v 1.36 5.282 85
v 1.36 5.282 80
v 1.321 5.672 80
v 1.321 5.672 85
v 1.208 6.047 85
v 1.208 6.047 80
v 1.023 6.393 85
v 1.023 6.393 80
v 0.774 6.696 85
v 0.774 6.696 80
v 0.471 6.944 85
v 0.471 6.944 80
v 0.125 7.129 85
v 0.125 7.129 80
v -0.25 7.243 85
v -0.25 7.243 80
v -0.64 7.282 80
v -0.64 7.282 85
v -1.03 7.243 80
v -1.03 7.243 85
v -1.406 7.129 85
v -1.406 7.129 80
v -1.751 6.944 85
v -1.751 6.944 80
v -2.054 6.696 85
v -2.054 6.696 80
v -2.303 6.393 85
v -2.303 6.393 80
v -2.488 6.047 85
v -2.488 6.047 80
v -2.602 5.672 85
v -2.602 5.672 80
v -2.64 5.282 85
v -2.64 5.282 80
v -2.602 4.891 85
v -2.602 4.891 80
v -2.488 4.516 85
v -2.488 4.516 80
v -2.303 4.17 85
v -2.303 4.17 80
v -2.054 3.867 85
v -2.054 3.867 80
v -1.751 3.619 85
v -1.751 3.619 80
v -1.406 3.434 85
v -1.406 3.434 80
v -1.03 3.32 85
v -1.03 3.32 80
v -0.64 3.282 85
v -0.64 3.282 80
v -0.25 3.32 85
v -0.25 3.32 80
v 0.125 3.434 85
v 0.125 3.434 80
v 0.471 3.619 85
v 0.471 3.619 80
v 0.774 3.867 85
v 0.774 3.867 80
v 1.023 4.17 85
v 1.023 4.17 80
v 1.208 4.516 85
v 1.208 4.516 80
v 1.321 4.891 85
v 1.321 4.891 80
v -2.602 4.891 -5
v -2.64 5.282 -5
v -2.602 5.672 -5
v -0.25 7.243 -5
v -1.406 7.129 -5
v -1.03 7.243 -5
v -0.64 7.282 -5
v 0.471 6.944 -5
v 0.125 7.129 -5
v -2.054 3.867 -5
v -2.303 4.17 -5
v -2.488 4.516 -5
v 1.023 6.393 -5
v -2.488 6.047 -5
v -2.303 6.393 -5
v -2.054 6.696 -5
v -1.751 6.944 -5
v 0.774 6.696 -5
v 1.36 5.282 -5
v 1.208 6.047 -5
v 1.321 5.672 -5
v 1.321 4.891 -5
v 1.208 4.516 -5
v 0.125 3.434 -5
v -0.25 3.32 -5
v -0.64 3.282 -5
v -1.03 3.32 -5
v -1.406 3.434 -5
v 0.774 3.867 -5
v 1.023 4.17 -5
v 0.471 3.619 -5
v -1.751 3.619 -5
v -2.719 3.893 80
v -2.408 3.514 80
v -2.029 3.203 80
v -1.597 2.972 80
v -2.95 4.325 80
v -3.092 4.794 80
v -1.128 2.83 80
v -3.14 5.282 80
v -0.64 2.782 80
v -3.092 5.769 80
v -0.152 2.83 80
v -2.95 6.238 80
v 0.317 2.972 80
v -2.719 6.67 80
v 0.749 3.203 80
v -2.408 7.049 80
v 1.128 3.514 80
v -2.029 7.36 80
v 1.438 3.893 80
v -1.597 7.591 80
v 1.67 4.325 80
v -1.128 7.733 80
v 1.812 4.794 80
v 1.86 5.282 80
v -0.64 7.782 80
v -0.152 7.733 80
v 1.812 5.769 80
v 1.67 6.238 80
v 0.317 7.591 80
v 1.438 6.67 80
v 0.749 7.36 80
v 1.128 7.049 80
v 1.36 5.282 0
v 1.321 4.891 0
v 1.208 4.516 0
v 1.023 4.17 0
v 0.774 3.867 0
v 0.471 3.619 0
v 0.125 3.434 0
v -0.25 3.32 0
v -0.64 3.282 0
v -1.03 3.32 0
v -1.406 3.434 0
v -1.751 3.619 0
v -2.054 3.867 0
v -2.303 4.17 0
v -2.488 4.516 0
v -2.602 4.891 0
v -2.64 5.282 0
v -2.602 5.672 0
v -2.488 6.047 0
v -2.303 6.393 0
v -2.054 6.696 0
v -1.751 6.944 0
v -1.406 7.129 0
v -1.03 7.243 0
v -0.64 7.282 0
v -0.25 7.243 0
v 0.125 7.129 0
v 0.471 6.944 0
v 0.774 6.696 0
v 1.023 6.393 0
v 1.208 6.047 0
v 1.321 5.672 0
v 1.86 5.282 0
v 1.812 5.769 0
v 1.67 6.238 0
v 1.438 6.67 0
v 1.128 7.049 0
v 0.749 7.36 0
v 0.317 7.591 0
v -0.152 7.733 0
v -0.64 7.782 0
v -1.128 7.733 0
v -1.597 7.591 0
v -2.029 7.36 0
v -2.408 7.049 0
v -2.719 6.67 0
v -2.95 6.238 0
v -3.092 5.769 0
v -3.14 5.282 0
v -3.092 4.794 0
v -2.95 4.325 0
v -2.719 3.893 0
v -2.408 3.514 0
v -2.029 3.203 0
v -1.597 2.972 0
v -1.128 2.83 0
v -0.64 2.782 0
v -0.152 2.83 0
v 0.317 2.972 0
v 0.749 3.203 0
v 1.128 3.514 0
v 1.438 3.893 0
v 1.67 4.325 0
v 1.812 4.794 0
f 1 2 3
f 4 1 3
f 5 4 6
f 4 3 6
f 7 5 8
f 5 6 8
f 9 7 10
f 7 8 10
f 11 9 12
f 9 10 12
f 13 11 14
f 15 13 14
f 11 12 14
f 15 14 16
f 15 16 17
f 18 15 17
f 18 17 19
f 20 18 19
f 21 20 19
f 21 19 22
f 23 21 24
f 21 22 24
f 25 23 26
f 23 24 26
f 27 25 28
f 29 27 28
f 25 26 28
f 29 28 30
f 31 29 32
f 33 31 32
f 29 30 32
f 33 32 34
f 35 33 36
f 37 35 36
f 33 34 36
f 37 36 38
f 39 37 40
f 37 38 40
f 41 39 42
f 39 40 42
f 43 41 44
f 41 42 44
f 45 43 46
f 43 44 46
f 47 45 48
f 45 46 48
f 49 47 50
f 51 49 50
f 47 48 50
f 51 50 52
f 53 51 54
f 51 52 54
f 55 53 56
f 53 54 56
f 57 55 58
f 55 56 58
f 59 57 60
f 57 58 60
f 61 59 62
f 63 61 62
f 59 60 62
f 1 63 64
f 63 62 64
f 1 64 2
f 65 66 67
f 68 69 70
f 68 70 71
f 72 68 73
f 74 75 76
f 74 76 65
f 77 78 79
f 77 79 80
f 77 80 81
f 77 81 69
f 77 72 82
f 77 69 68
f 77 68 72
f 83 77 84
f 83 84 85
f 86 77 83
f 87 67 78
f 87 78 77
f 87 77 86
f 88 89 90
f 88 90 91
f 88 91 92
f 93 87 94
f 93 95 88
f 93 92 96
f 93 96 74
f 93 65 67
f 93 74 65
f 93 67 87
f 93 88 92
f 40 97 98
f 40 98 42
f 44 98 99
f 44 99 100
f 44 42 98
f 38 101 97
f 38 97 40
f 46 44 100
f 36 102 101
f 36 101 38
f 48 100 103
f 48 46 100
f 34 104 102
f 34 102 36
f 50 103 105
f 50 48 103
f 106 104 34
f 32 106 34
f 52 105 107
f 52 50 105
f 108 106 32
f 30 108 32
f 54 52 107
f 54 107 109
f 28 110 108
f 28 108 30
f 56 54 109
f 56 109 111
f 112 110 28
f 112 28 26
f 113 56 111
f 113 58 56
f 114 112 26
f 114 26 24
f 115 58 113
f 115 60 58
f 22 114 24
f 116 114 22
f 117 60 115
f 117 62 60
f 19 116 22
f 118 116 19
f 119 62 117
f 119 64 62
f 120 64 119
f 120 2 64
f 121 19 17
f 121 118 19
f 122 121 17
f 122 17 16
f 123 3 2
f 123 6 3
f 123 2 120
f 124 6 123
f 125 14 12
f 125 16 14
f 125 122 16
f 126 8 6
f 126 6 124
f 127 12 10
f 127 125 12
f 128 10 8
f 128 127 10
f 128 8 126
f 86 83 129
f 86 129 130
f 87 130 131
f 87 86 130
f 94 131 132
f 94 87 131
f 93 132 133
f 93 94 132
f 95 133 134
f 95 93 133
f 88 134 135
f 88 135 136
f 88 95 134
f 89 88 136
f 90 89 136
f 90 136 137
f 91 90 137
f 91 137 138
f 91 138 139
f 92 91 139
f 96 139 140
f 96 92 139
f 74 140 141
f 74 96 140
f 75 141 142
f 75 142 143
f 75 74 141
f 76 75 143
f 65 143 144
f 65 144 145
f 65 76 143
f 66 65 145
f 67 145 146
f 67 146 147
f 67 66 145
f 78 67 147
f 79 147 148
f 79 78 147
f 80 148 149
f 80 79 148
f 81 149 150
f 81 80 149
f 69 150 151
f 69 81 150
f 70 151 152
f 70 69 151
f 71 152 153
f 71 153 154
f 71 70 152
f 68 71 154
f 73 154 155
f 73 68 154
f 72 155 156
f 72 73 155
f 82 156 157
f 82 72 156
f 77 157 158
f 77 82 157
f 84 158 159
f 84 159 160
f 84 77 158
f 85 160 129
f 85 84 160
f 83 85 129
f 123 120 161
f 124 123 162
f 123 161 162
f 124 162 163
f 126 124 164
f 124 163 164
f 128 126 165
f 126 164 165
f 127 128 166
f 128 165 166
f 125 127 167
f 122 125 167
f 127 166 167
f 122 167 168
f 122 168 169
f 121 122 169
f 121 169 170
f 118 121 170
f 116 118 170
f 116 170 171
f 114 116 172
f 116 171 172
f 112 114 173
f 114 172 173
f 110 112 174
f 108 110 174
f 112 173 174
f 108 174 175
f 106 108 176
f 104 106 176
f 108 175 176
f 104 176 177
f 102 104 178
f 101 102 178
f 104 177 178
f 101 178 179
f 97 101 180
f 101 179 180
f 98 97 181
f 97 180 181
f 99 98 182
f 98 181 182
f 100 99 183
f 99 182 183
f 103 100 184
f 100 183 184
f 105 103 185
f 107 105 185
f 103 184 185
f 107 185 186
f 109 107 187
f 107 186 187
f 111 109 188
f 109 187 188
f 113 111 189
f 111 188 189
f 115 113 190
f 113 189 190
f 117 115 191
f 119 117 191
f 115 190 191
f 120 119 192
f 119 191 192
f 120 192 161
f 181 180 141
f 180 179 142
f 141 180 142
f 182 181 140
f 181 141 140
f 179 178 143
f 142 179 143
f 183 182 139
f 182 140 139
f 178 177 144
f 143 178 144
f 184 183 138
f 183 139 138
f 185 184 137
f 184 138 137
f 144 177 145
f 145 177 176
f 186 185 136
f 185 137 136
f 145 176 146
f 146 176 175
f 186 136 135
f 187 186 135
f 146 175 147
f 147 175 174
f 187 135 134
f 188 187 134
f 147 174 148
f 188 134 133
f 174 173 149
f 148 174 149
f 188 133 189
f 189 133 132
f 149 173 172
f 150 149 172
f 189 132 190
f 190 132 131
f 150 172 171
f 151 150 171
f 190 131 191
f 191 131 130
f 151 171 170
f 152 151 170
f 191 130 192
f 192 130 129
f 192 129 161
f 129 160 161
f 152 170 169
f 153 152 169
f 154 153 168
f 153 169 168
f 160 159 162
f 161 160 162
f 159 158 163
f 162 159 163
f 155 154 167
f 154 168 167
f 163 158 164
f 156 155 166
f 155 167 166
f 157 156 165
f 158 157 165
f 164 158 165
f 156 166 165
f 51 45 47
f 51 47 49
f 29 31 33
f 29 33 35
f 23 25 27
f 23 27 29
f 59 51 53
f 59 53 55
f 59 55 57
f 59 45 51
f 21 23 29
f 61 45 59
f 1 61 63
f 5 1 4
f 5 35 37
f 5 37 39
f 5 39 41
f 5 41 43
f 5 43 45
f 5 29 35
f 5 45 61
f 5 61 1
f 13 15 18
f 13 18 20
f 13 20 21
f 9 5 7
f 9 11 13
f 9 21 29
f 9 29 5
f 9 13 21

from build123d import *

# Parameters (mm, degrees)
SKETCH_1_R      = 2.5
EXTRUDE_1_DEPTH = 80
SKETCH_2_R      = 2
EXTRUDE_2_DEPTH = 5
EXTRUDE_START   = 5
SKETCH_3_R      = 2
EXTRUDE_3_DEPTH = 5


with BuildPart() as part:
    # 草图1 → 凸台-拉伸1 (new body)
    with BuildSketch(Plane.XY):
        with Locations((-0.6401844, 5.281521297)):
            Circle(SKETCH_1_R)
    extrude(amount=EXTRUDE_1_DEPTH)

    # 草图2 → 凸台-拉伸2 (add)
    with BuildSketch(Plane.XY.offset(80)):
        with Locations((-0.6401844, 5.281521297)):
            Circle(SKETCH_2_R)
    extrude(amount=EXTRUDE_2_DEPTH)

    # 草图3 → 凸台-拉伸3 (add)
    with BuildSketch(Plane(origin=(0, 0, 0), x_dir=(-1, 0, 0), z_dir=(0, 0, -1)).offset(EXTRUDE_START)):
        with Locations(Location((0.6401844, 5.281521297, 0), (0, 0, 180))):
            Circle(SKETCH_3_R)
    extrude(amount=-EXTRUDE_3_DEPTH)


solid = part.part
